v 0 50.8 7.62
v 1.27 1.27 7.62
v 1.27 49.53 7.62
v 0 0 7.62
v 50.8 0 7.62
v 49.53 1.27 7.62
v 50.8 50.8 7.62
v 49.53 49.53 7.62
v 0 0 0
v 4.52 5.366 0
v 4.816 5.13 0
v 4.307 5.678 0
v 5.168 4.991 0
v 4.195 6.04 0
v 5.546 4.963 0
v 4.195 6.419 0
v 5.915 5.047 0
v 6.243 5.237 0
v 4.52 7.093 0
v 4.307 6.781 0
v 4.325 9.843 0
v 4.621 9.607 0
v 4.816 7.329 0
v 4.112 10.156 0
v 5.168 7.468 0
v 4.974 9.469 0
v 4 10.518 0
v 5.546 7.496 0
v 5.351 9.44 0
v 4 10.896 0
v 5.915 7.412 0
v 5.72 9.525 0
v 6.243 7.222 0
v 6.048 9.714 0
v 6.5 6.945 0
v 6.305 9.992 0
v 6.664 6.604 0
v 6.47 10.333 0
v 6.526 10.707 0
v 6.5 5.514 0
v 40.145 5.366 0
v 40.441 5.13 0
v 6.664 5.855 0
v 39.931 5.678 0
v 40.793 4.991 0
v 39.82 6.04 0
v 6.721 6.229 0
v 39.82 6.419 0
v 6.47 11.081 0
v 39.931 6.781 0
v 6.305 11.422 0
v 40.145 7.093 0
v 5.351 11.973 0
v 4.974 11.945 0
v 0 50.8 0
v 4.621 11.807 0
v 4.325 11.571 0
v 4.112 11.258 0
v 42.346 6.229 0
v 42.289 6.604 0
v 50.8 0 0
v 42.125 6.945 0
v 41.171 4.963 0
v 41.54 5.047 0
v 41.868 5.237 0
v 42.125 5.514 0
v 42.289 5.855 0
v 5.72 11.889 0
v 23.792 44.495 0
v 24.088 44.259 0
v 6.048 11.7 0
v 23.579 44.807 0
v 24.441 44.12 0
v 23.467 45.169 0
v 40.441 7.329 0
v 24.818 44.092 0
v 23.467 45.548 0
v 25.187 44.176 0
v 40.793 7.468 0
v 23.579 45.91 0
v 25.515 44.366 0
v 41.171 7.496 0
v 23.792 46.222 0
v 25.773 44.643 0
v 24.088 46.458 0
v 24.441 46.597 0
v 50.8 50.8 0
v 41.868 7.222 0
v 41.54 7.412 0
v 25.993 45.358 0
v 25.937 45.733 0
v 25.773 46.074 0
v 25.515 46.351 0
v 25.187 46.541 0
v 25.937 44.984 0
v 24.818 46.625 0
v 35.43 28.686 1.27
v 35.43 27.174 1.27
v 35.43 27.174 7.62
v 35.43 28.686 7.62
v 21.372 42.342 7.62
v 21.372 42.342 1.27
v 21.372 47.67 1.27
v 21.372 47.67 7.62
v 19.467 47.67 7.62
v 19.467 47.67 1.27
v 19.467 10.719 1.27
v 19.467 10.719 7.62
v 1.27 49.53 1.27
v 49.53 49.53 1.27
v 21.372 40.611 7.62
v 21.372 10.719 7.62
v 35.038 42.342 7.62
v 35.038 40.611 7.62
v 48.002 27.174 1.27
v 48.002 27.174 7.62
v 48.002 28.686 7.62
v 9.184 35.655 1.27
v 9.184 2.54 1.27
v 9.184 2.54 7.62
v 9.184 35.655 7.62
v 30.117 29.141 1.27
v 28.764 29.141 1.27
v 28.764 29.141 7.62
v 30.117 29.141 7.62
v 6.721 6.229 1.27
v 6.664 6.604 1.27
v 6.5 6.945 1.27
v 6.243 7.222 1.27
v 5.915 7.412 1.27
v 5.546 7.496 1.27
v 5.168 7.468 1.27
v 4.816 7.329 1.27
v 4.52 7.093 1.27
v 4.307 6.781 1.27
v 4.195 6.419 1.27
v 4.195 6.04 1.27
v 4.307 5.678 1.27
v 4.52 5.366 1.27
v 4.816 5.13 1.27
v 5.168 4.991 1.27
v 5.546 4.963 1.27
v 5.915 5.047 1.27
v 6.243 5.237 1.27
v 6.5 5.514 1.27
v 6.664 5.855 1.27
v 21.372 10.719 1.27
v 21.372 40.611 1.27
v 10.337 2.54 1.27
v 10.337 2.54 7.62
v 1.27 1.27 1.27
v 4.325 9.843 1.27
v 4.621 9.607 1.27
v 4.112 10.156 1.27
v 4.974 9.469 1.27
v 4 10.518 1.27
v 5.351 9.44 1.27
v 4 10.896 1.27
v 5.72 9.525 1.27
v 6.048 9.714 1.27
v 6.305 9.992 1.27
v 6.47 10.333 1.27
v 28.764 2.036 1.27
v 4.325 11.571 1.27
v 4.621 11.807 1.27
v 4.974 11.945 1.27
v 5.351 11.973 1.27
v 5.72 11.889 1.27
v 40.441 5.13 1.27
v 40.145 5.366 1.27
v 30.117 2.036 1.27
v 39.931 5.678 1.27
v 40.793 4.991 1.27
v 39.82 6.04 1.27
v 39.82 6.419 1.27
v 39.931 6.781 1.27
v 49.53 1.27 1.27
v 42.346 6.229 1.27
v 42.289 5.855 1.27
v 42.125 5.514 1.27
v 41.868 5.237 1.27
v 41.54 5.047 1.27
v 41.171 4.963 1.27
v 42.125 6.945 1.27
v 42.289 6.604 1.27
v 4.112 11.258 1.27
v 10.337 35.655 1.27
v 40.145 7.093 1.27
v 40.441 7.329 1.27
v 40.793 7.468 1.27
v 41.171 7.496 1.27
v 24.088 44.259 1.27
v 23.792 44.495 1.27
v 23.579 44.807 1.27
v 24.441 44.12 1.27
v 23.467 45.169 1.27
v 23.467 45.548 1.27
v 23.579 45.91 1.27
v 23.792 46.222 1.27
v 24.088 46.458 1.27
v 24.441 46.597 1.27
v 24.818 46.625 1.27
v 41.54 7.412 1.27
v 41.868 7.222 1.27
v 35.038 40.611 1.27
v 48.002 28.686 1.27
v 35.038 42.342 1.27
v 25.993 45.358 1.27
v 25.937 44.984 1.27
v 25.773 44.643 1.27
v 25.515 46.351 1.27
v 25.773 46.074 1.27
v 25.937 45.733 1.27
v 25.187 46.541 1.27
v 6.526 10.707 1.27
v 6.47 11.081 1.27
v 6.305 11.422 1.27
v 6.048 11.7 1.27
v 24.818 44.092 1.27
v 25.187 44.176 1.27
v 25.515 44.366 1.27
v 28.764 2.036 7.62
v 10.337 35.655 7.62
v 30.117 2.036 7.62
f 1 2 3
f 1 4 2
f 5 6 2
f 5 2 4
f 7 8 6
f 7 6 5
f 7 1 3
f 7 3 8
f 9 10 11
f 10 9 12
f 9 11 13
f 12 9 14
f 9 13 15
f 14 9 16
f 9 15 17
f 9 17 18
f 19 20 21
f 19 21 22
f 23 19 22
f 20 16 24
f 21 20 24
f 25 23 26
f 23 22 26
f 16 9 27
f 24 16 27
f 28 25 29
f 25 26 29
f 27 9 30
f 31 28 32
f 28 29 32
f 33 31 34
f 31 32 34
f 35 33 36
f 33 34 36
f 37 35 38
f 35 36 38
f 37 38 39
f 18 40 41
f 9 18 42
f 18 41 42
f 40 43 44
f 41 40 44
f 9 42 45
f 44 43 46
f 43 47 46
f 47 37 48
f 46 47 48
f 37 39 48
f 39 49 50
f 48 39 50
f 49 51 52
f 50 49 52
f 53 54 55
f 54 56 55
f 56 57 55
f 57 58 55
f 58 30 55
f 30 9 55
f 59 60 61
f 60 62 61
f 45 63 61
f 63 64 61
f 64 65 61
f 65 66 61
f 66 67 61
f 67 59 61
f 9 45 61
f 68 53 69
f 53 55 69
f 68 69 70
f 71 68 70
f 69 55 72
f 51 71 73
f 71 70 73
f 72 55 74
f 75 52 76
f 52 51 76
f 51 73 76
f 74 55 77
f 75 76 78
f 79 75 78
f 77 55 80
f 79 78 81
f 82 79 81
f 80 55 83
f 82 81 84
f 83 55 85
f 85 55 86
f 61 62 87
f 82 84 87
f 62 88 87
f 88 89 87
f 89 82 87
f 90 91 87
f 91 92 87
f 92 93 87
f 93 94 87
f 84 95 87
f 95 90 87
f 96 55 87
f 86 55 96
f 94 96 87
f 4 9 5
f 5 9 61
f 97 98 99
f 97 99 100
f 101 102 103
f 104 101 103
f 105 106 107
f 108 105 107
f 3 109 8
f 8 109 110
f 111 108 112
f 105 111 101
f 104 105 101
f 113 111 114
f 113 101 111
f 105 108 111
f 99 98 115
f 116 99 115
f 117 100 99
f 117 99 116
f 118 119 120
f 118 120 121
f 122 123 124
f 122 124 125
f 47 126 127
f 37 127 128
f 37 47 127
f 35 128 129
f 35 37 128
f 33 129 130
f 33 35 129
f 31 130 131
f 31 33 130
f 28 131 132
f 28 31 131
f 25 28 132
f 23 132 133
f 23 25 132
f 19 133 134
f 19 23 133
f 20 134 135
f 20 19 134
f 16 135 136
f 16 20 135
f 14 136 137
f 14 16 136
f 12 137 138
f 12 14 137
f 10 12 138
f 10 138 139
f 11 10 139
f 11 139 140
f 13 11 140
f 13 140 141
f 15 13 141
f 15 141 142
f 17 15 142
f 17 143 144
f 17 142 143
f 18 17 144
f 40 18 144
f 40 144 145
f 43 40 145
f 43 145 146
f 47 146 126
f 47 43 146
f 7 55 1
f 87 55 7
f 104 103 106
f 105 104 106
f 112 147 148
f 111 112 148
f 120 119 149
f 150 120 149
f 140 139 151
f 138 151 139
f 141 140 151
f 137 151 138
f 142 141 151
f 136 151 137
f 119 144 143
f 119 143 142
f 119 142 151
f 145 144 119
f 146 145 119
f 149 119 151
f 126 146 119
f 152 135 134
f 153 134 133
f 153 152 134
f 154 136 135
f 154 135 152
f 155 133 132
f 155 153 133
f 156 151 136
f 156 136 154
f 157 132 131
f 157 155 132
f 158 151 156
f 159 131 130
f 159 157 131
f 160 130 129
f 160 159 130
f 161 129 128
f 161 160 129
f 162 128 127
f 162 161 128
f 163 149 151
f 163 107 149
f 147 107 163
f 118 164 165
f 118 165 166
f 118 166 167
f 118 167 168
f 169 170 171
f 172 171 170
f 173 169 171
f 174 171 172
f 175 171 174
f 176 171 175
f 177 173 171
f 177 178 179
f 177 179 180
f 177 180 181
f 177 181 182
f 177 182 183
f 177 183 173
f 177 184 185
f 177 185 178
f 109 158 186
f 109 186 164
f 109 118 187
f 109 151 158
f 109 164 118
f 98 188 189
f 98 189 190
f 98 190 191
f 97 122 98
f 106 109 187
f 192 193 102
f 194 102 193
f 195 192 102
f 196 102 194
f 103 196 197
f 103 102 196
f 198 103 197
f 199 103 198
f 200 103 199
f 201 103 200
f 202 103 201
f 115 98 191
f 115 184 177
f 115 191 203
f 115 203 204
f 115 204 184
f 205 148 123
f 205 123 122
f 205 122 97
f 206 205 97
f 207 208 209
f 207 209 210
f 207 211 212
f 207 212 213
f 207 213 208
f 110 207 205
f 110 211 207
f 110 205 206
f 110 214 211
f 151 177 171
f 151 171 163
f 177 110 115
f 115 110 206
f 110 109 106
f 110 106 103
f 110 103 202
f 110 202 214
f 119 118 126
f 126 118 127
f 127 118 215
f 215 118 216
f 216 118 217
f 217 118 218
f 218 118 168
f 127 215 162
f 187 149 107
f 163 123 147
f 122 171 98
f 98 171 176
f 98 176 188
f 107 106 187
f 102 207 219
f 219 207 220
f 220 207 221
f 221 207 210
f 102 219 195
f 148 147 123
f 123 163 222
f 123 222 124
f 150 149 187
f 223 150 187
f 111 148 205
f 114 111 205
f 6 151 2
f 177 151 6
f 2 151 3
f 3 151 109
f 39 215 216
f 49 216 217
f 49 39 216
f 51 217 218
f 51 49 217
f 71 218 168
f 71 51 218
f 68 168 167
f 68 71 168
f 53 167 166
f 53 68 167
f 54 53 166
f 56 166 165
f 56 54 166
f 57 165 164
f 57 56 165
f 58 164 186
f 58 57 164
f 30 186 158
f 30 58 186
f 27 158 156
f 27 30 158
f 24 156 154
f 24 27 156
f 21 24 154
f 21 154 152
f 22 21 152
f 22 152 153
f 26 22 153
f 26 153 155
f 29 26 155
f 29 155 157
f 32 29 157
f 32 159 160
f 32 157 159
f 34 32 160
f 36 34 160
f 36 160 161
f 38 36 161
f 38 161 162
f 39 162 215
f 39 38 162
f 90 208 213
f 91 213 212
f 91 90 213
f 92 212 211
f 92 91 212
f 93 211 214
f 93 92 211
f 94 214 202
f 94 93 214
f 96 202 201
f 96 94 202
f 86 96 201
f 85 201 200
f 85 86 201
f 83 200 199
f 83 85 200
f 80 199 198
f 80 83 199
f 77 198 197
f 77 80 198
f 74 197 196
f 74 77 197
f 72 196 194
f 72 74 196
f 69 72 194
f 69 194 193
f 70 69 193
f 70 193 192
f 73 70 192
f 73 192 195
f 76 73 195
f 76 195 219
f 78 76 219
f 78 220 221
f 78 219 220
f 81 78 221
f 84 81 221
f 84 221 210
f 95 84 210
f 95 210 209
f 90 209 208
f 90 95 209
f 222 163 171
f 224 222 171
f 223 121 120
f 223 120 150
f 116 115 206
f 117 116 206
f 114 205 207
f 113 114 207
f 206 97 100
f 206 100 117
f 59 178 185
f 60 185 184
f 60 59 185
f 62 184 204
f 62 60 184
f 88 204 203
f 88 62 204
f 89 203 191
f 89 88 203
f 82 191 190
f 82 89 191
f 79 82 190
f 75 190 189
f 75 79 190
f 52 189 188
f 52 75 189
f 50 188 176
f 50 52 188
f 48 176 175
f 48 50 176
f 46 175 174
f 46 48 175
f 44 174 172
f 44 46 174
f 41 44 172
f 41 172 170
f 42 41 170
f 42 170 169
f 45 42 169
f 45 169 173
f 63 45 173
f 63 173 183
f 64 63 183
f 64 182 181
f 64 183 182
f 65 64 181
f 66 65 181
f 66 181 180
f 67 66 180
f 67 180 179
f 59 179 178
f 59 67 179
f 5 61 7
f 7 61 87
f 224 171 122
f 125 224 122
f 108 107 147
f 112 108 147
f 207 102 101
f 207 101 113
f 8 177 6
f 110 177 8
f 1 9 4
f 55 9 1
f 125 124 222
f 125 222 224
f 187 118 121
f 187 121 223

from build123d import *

# Parameters (mm, degrees)
F0_W     = 50.8
F0_H     = 50.8
F1_DEPTH = 7.62
F2_T     = -1.27
F3_W     = 1.152528
F3_H     = 33.115175
F3_W_2   = 13.665814
F3_H_2   = 1.731235
F3_W_3   = 1.353253
F3_H_3   = 27.104161
F3_W_4   = 12.571838
F3_H_4   = 1.511616
F4_DEPTH = 7.62
F5_R     = 1.27
F6_DEPTH = 7.621


with BuildPart() as f1:
    # F0 (on Top) → F1 (new body)
    with BuildSketch(Plane.XY):
        with Locations((25.4, 25.4)):
            Rectangle(F0_W, F0_H)
    extrude(amount=F1_DEPTH)

    # F2
    f2_openings = [f1.faces().sort_by_distance(p)[0] for p in [
        (25.4, 25.4, 7.62),
    ]]
    offset(amount=F2_T, openings=f2_openings)

    # F3 (on Top) → F4 (join)
    with BuildSketch(Plane.XY):
        with Locations((9.76058, 19.097683)):
            Rectangle(F3_W, F3_H)
        Polygon((21.372069, 42.3421), (21.372069, 47.670342), (19.46665, 47.670342), (19.46665, 10.718926), (21.372069, 10.718926), (21.372069, 40.610865), align=None)
        with Locations((28.204976, 41.476482)):
            Rectangle(F3_W_2, F3_H_2)
        with Locations((29.44033, 15.588485)):
            Rectangle(F3_W_3, F3_H_3)
        with Locations((41.71568, 27.930296)):
            Rectangle(F3_W_4, F3_H_4)
    extrude(amount=F4_DEPTH)

    # F5 (on Top) → F6 (cut, through all)
    with BuildSketch(Plane.XY):
        with Locations((5.450803, 6.229489)):
            Circle(F5_R)
        with Locations((5.256131, 10.706934)):
            Circle(F5_R)
        with Locations((41.075695, 6.229489)):
            Circle(F5_R)
        with Locations((24.723286, 45.358468)):
            Circle(F5_R)
    extrude(amount=F6_DEPTH, mode=Mode.SUBTRACT)


solid = f1.part
